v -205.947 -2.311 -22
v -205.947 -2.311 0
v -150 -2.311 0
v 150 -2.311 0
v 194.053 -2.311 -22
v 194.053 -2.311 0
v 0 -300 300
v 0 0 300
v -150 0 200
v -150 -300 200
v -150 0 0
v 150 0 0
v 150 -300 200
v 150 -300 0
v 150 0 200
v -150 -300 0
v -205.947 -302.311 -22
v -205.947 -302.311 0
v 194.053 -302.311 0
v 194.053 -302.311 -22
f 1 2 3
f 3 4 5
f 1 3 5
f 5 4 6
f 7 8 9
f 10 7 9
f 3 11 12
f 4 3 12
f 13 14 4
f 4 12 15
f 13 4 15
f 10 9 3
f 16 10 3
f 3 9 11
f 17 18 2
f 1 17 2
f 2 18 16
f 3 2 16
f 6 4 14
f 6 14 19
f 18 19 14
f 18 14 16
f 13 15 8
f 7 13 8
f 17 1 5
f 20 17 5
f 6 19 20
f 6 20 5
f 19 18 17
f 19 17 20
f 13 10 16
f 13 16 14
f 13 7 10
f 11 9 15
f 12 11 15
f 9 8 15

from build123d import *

# Parameters (mm, degrees)
F1_DEPTH = 300
F2_DEPTH = 300
F3_W     = 400
F3_H     = 300
F4_DEPTH = 22


with BuildPart() as f1:
    # F0 (on Front) → F1 (new body)
    with BuildSketch(Plane.XZ):
        Polygon((-150, 200), (-150, 0), (150, 0), (150, 200), (0, 200), align=None)
    extrude(amount=F1_DEPTH)

    # F0 (on Front) → F2 (join)
    with BuildSketch(Plane.XZ):
        Polygon((-150, 200), (-150, 0), (150, 0), (150, 200), (0, 200), align=None)
        Polygon((0, 300), (-150, 200), (0, 200), align=None)
        Polygon((0, 200), (150, 200), (0, 300), align=None)
    extrude(amount=F2_DEPTH)

    # F3 (on Top) → F4 (join)
    with BuildSketch(Plane.XY):
        with Locations((-5.947308, -152.311442)):
            Rectangle(F3_W, F3_H)
    extrude(amount=-F4_DEPTH)


solid = f1.part
